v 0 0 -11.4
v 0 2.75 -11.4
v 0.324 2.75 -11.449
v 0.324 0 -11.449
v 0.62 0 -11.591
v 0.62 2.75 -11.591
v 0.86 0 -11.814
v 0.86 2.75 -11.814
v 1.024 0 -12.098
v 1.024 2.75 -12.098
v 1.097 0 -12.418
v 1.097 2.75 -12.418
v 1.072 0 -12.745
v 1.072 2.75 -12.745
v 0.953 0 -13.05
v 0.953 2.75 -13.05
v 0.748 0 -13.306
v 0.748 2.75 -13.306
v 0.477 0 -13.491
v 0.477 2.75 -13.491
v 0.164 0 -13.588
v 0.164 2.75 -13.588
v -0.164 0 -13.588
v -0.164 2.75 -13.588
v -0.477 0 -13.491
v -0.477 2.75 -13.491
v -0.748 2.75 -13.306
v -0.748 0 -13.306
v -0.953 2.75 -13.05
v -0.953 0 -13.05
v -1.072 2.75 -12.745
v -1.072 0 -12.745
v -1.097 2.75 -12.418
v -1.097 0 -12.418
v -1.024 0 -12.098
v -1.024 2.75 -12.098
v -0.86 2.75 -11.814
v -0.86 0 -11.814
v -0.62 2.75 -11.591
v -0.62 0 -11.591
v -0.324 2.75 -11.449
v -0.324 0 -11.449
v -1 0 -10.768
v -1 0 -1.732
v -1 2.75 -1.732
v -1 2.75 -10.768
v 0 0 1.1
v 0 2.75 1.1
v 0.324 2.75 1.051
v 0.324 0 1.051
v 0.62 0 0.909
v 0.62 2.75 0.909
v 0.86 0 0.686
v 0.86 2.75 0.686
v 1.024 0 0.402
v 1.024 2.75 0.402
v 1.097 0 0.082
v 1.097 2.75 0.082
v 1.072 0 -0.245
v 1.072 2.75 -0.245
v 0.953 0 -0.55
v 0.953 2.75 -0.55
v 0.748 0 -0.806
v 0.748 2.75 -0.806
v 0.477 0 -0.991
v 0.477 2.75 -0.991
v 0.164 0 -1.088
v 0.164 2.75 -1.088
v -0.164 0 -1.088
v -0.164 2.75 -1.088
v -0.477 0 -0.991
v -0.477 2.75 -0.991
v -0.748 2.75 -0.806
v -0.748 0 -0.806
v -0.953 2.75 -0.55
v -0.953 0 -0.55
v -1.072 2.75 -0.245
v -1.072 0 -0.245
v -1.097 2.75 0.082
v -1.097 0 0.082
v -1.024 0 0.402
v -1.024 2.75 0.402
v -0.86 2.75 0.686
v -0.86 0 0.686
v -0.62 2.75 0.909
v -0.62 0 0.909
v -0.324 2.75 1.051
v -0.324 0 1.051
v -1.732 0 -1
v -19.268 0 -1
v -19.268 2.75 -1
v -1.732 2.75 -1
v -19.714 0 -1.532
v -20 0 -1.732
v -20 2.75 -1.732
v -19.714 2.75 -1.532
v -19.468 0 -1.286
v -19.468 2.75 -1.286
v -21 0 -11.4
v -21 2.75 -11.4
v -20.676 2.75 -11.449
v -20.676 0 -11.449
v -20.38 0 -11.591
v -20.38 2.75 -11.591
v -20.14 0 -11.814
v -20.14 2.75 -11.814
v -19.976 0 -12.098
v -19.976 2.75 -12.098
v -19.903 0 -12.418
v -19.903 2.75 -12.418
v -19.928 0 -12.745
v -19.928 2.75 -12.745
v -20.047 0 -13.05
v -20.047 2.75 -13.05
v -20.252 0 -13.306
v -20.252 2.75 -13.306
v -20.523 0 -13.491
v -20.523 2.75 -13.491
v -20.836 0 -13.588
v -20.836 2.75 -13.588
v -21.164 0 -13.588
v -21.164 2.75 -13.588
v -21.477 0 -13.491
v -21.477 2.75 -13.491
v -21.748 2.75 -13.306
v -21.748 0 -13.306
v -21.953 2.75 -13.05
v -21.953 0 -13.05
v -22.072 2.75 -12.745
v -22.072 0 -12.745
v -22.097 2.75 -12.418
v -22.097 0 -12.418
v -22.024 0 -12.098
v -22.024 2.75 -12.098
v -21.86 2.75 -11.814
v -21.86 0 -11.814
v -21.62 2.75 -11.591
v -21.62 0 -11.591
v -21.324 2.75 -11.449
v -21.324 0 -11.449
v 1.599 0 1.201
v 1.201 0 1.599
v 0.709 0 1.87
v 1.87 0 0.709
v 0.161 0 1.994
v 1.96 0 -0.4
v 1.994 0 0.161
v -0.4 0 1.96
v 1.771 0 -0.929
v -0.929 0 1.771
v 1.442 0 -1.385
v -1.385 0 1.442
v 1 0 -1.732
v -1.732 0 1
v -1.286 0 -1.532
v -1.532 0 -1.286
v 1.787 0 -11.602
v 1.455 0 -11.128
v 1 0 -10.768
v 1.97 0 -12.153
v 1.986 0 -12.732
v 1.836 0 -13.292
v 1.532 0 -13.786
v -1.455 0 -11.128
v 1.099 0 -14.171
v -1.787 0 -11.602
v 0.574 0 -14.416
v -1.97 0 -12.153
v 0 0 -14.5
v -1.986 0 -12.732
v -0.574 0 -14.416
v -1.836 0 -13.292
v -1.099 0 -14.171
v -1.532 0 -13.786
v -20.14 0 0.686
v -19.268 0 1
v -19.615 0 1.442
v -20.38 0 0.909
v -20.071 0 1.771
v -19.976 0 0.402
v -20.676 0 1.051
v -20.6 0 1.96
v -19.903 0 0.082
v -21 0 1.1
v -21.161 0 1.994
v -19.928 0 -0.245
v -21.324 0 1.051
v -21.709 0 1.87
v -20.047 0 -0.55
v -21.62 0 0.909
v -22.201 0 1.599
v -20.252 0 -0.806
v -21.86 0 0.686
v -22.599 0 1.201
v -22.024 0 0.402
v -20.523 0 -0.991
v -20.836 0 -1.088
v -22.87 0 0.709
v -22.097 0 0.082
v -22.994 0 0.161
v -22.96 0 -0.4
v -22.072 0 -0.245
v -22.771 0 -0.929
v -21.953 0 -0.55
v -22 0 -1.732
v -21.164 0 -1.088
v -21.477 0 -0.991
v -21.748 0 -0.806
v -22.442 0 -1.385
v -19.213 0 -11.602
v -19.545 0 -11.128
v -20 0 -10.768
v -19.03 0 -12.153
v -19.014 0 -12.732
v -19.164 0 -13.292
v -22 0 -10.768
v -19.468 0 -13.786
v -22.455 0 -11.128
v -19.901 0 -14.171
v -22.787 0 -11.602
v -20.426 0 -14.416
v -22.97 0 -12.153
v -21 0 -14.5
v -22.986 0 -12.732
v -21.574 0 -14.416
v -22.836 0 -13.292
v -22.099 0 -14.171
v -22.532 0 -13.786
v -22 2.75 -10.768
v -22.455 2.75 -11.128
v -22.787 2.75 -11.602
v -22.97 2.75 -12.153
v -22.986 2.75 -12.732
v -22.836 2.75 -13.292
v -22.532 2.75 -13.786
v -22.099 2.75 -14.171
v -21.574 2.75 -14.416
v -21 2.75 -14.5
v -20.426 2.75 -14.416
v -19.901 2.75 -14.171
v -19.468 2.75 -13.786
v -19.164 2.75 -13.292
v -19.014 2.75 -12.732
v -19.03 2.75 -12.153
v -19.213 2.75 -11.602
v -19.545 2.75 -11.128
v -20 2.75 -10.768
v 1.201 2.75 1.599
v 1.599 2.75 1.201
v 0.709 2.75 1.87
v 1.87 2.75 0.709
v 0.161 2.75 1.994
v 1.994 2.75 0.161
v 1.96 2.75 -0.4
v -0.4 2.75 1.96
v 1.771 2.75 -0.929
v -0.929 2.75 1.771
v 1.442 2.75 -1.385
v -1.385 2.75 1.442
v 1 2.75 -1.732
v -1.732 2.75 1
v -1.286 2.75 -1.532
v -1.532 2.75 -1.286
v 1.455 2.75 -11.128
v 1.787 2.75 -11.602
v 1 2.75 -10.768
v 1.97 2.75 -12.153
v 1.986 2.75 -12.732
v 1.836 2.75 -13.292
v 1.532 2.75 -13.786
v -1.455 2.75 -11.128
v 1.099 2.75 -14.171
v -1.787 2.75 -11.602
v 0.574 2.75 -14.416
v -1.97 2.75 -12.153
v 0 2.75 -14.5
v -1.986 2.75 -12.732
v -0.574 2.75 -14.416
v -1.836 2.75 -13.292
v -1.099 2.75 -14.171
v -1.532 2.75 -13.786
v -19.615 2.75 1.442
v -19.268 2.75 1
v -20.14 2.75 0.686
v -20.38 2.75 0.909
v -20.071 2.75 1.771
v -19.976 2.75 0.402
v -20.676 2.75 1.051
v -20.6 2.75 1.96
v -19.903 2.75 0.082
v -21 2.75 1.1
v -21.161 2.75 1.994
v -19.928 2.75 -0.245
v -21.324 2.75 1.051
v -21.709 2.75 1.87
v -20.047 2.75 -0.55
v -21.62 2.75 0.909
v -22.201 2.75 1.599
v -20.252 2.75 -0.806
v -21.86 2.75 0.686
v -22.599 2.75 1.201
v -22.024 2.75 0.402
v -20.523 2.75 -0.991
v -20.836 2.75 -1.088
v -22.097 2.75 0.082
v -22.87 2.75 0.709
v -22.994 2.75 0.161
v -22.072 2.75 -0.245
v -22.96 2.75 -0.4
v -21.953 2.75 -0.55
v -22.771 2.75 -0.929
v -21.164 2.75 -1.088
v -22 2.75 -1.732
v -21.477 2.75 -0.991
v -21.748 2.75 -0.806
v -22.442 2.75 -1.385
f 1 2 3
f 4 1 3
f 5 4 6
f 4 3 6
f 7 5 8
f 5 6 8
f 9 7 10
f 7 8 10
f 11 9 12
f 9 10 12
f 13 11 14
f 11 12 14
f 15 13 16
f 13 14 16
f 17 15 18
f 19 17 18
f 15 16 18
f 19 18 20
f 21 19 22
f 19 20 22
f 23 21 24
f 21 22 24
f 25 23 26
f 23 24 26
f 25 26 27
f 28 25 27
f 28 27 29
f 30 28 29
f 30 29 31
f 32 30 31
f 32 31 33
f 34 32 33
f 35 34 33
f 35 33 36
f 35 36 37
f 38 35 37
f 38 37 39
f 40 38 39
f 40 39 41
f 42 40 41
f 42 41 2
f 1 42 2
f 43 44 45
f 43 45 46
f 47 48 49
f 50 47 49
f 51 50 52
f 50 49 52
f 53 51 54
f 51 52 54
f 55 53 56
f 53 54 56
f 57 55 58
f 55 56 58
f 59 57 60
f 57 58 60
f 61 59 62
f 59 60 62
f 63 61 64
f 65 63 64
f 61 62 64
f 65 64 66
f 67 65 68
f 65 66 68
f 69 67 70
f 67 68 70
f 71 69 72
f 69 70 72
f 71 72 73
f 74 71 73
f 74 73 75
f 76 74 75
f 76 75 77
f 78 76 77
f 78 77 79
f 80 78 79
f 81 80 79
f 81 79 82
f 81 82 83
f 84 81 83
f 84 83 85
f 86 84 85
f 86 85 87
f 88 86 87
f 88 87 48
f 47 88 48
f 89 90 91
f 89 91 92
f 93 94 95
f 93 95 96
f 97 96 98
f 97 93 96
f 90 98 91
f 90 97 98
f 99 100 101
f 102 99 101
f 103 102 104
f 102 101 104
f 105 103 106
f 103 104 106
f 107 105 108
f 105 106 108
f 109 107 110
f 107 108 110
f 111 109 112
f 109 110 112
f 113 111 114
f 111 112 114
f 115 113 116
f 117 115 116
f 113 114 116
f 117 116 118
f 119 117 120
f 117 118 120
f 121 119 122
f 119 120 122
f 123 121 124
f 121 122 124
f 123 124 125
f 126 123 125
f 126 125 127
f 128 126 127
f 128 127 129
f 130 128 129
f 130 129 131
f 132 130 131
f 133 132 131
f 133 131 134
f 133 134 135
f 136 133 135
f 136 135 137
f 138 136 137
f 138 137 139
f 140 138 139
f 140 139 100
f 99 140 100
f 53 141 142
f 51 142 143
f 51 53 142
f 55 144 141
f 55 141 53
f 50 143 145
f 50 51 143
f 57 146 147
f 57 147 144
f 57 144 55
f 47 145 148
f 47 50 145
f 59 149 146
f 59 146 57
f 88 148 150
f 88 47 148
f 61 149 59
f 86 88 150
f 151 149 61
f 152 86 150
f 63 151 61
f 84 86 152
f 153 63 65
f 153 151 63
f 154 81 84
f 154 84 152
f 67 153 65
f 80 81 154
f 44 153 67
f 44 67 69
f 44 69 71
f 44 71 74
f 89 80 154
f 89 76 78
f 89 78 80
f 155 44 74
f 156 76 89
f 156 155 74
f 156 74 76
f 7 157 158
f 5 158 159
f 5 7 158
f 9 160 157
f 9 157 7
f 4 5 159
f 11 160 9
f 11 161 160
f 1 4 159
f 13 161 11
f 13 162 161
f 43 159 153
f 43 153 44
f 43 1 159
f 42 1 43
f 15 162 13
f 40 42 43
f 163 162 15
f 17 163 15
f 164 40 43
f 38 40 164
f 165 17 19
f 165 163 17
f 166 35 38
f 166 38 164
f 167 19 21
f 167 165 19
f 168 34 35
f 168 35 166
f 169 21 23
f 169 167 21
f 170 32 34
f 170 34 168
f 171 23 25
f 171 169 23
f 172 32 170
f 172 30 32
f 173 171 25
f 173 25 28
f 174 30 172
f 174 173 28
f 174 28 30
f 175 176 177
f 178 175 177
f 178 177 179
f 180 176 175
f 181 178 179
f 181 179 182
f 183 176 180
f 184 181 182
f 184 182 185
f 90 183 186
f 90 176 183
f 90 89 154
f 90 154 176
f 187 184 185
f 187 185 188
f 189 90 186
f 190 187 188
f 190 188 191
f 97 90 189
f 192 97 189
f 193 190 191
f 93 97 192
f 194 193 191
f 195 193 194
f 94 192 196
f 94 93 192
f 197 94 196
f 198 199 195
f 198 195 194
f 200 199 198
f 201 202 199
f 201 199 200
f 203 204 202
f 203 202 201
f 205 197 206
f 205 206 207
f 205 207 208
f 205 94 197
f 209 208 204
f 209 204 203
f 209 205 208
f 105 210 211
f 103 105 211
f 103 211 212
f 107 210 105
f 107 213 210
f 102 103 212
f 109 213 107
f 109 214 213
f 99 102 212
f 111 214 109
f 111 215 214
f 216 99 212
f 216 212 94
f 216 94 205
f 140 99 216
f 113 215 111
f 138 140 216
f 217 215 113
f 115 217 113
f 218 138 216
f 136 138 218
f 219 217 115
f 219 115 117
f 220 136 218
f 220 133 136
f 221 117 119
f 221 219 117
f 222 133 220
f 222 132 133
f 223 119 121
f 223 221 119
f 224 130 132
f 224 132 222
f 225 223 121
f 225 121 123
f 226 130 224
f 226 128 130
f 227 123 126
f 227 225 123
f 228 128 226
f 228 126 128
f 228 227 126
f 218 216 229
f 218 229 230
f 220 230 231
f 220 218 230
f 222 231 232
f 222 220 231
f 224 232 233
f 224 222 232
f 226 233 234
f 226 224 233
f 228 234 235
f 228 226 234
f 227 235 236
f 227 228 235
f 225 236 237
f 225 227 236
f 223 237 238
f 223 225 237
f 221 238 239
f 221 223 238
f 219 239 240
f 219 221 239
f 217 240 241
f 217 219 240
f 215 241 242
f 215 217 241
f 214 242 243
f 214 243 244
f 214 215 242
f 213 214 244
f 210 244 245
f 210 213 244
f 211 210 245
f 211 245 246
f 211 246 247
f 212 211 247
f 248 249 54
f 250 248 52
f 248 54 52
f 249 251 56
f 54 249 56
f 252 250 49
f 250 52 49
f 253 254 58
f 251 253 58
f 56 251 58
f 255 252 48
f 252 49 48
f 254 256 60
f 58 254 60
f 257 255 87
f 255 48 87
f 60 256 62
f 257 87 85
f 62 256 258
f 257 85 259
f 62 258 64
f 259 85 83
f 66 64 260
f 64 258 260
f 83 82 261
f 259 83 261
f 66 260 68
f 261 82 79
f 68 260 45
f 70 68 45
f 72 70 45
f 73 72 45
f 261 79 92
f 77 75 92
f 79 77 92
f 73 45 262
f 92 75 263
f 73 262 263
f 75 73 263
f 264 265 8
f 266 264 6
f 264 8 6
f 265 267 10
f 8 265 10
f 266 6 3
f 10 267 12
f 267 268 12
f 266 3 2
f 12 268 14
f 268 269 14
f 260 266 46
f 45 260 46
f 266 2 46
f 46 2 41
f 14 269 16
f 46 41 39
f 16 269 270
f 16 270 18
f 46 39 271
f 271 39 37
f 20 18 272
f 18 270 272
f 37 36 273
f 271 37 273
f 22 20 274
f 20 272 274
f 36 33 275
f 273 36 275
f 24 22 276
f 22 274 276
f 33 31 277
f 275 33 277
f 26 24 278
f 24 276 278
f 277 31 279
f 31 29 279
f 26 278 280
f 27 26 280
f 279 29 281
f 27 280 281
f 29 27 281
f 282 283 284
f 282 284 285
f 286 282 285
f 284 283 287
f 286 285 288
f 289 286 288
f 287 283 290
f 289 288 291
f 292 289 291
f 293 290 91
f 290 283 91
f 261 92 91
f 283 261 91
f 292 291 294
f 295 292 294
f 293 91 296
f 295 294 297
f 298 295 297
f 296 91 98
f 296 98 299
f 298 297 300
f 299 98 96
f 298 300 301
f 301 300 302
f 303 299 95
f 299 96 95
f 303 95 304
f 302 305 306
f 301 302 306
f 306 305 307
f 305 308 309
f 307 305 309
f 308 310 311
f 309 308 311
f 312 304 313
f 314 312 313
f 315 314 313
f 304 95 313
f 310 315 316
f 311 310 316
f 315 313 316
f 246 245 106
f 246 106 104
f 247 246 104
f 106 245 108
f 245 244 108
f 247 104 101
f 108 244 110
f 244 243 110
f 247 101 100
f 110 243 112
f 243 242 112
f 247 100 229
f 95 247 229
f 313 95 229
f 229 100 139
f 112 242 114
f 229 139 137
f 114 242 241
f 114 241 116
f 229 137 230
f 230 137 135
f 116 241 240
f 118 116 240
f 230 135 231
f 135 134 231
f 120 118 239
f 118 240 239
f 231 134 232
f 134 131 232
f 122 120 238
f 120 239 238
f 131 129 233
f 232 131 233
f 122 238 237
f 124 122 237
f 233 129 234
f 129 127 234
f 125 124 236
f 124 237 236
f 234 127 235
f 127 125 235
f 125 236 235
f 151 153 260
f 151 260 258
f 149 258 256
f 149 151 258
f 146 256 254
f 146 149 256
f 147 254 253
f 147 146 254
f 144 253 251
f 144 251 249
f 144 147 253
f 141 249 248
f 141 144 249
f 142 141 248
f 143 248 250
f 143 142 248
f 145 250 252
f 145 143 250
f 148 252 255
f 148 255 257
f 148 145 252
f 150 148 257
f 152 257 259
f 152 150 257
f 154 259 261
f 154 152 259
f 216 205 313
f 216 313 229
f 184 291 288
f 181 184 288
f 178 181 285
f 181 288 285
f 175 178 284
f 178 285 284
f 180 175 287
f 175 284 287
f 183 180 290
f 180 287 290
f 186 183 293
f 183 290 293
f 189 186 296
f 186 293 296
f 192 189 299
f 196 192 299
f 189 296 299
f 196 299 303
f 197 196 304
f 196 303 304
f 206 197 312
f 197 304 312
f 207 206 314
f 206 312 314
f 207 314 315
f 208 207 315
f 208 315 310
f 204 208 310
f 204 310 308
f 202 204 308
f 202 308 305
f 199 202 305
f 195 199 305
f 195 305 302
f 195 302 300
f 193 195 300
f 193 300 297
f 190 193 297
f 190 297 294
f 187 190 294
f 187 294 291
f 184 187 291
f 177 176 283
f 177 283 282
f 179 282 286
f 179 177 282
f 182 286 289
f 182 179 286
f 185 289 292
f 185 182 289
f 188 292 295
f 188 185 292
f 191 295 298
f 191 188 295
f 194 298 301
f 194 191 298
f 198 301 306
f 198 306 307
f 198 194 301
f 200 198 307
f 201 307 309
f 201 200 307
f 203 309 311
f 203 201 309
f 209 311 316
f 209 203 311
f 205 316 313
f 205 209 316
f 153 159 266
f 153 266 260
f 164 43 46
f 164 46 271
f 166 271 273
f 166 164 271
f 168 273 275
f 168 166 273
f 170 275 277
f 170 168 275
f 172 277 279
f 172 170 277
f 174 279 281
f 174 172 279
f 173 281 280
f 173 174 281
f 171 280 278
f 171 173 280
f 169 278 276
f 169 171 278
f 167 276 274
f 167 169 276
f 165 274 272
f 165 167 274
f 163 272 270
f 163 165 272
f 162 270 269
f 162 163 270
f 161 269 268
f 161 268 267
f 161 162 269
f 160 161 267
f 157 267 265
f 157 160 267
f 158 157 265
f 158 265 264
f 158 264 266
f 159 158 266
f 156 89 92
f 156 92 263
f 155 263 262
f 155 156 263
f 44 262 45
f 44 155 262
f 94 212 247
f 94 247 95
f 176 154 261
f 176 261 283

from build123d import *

# Parameters (mm, degrees)
EXTUDEMAIN_DEPTH = 2.75
PIHOLES_REACH    = 29.328
SKETCH2_R        = 1.1


with BuildPart() as part:
    # Main → ExtudeMain (new body)
    with BuildSketch(Plane(origin=(0, 0, 0), x_dir=(1, 0, 0), z_dir=(0, 1, 0))):
        with BuildLine():
            Line((-19.267949192, 1), (-1.732050808, 1))
            ThreePointArc((-1.732050808, 1), (-1.414213562, 1.414213562), (-1, 1.732050808))
            Line((-1, 1.732050808), (-1, 10.767949192))
            ThreePointArc((-1, 10.767949192), (0, 14.5), (1, 10.767949192))
            Line((1, 10.767949192), (1, 1.732050808))
            ThreePointArc((1, 1.732050808), (1.414213562, -1.414213562), (-1.732050808, -1))
            Line((-1.732050808, -1), (-19.267949192, -1))
            ThreePointArc((-19.267949192, -1), (-22.414213562, -1.414213562), (-22, 1.732050808))
            Line((-22, 1.732050808), (-22, 10.767949192))
            ThreePointArc((-22, 10.767949192), (-21, 14.5), (-20, 10.767949192))
            Line((-20, 10.767949192), (-20, 1.732050808))
            ThreePointArc((-20, 1.732050808), (-19.585786438, 1.414213562), (-19.267949192, 1))
        make_face()
    extrude(amount=EXTUDEMAIN_DEPTH)

    # Sketch2 → PiHoles (cut, up to next)
    with BuildSketch(Plane(origin=(0, 2.75, 0), x_dir=(1, 0, 0), z_dir=(0, 1, 0)), mode=Mode.PRIVATE) as piholes_sk1:
        with Locations(Location((-21, 12.5, 0), (0, 0, 270))):
            Circle(SKETCH2_R)
    piholes_tool1 = extrude(piholes_sk1.sketch, amount=-PIHOLES_REACH, mode=Mode.PRIVATE) & part.part
    # Sketch2 → PiHoles (cut, up to next)
    with BuildSketch(Plane(origin=(0, 2.75, 0), x_dir=(1, 0, 0), z_dir=(0, 1, 0)), mode=Mode.PRIVATE) as piholes_sk2:
        with Locations(Location((0, 12.5, 0), (0, 0, 270))):
            Circle(SKETCH2_R)
    piholes_tool2 = extrude(piholes_sk2.sketch, amount=-PIHOLES_REACH, mode=Mode.PRIVATE) & part.part
    # Sketch2 → PiHoles (cut, up to next)
    with BuildSketch(Plane(origin=(0, 2.75, 0), x_dir=(1, 0, 0), z_dir=(0, 1, 0)), mode=Mode.PRIVATE) as piholes_sk3:
        with Locations(Location((0, 0, 0), (0, 0, 270))):
            Circle(SKETCH2_R)
    piholes_tool3 = extrude(piholes_sk3.sketch, amount=-PIHOLES_REACH, mode=Mode.PRIVATE) & part.part
    # Sketch2 → PiHoles (cut, up to next)
    with BuildSketch(Plane(origin=(0, 2.75, 0), x_dir=(1, 0, 0), z_dir=(0, 1, 0)), mode=Mode.PRIVATE) as piholes_sk4:
        with Locations(Location((-21, 0, 0), (0, 0, 270))):
            Circle(SKETCH2_R)
    piholes_tool4 = extrude(piholes_sk4.sketch, amount=-PIHOLES_REACH, mode=Mode.PRIVATE) & part.part
    add(piholes_tool1.solids().sort_by_distance((-21, 2.75, -12.5))[0], mode=Mode.SUBTRACT)
    add(piholes_tool2.solids().sort_by_distance((0, 2.75, -12.5))[0], mode=Mode.SUBTRACT)
    add(piholes_tool3.solids().sort_by_distance((0, 2.75, 0))[0], mode=Mode.SUBTRACT)
    add(piholes_tool4.solids().sort_by_distance((-21, 2.75, 0))[0], mode=Mode.SUBTRACT)


solid = part.part
